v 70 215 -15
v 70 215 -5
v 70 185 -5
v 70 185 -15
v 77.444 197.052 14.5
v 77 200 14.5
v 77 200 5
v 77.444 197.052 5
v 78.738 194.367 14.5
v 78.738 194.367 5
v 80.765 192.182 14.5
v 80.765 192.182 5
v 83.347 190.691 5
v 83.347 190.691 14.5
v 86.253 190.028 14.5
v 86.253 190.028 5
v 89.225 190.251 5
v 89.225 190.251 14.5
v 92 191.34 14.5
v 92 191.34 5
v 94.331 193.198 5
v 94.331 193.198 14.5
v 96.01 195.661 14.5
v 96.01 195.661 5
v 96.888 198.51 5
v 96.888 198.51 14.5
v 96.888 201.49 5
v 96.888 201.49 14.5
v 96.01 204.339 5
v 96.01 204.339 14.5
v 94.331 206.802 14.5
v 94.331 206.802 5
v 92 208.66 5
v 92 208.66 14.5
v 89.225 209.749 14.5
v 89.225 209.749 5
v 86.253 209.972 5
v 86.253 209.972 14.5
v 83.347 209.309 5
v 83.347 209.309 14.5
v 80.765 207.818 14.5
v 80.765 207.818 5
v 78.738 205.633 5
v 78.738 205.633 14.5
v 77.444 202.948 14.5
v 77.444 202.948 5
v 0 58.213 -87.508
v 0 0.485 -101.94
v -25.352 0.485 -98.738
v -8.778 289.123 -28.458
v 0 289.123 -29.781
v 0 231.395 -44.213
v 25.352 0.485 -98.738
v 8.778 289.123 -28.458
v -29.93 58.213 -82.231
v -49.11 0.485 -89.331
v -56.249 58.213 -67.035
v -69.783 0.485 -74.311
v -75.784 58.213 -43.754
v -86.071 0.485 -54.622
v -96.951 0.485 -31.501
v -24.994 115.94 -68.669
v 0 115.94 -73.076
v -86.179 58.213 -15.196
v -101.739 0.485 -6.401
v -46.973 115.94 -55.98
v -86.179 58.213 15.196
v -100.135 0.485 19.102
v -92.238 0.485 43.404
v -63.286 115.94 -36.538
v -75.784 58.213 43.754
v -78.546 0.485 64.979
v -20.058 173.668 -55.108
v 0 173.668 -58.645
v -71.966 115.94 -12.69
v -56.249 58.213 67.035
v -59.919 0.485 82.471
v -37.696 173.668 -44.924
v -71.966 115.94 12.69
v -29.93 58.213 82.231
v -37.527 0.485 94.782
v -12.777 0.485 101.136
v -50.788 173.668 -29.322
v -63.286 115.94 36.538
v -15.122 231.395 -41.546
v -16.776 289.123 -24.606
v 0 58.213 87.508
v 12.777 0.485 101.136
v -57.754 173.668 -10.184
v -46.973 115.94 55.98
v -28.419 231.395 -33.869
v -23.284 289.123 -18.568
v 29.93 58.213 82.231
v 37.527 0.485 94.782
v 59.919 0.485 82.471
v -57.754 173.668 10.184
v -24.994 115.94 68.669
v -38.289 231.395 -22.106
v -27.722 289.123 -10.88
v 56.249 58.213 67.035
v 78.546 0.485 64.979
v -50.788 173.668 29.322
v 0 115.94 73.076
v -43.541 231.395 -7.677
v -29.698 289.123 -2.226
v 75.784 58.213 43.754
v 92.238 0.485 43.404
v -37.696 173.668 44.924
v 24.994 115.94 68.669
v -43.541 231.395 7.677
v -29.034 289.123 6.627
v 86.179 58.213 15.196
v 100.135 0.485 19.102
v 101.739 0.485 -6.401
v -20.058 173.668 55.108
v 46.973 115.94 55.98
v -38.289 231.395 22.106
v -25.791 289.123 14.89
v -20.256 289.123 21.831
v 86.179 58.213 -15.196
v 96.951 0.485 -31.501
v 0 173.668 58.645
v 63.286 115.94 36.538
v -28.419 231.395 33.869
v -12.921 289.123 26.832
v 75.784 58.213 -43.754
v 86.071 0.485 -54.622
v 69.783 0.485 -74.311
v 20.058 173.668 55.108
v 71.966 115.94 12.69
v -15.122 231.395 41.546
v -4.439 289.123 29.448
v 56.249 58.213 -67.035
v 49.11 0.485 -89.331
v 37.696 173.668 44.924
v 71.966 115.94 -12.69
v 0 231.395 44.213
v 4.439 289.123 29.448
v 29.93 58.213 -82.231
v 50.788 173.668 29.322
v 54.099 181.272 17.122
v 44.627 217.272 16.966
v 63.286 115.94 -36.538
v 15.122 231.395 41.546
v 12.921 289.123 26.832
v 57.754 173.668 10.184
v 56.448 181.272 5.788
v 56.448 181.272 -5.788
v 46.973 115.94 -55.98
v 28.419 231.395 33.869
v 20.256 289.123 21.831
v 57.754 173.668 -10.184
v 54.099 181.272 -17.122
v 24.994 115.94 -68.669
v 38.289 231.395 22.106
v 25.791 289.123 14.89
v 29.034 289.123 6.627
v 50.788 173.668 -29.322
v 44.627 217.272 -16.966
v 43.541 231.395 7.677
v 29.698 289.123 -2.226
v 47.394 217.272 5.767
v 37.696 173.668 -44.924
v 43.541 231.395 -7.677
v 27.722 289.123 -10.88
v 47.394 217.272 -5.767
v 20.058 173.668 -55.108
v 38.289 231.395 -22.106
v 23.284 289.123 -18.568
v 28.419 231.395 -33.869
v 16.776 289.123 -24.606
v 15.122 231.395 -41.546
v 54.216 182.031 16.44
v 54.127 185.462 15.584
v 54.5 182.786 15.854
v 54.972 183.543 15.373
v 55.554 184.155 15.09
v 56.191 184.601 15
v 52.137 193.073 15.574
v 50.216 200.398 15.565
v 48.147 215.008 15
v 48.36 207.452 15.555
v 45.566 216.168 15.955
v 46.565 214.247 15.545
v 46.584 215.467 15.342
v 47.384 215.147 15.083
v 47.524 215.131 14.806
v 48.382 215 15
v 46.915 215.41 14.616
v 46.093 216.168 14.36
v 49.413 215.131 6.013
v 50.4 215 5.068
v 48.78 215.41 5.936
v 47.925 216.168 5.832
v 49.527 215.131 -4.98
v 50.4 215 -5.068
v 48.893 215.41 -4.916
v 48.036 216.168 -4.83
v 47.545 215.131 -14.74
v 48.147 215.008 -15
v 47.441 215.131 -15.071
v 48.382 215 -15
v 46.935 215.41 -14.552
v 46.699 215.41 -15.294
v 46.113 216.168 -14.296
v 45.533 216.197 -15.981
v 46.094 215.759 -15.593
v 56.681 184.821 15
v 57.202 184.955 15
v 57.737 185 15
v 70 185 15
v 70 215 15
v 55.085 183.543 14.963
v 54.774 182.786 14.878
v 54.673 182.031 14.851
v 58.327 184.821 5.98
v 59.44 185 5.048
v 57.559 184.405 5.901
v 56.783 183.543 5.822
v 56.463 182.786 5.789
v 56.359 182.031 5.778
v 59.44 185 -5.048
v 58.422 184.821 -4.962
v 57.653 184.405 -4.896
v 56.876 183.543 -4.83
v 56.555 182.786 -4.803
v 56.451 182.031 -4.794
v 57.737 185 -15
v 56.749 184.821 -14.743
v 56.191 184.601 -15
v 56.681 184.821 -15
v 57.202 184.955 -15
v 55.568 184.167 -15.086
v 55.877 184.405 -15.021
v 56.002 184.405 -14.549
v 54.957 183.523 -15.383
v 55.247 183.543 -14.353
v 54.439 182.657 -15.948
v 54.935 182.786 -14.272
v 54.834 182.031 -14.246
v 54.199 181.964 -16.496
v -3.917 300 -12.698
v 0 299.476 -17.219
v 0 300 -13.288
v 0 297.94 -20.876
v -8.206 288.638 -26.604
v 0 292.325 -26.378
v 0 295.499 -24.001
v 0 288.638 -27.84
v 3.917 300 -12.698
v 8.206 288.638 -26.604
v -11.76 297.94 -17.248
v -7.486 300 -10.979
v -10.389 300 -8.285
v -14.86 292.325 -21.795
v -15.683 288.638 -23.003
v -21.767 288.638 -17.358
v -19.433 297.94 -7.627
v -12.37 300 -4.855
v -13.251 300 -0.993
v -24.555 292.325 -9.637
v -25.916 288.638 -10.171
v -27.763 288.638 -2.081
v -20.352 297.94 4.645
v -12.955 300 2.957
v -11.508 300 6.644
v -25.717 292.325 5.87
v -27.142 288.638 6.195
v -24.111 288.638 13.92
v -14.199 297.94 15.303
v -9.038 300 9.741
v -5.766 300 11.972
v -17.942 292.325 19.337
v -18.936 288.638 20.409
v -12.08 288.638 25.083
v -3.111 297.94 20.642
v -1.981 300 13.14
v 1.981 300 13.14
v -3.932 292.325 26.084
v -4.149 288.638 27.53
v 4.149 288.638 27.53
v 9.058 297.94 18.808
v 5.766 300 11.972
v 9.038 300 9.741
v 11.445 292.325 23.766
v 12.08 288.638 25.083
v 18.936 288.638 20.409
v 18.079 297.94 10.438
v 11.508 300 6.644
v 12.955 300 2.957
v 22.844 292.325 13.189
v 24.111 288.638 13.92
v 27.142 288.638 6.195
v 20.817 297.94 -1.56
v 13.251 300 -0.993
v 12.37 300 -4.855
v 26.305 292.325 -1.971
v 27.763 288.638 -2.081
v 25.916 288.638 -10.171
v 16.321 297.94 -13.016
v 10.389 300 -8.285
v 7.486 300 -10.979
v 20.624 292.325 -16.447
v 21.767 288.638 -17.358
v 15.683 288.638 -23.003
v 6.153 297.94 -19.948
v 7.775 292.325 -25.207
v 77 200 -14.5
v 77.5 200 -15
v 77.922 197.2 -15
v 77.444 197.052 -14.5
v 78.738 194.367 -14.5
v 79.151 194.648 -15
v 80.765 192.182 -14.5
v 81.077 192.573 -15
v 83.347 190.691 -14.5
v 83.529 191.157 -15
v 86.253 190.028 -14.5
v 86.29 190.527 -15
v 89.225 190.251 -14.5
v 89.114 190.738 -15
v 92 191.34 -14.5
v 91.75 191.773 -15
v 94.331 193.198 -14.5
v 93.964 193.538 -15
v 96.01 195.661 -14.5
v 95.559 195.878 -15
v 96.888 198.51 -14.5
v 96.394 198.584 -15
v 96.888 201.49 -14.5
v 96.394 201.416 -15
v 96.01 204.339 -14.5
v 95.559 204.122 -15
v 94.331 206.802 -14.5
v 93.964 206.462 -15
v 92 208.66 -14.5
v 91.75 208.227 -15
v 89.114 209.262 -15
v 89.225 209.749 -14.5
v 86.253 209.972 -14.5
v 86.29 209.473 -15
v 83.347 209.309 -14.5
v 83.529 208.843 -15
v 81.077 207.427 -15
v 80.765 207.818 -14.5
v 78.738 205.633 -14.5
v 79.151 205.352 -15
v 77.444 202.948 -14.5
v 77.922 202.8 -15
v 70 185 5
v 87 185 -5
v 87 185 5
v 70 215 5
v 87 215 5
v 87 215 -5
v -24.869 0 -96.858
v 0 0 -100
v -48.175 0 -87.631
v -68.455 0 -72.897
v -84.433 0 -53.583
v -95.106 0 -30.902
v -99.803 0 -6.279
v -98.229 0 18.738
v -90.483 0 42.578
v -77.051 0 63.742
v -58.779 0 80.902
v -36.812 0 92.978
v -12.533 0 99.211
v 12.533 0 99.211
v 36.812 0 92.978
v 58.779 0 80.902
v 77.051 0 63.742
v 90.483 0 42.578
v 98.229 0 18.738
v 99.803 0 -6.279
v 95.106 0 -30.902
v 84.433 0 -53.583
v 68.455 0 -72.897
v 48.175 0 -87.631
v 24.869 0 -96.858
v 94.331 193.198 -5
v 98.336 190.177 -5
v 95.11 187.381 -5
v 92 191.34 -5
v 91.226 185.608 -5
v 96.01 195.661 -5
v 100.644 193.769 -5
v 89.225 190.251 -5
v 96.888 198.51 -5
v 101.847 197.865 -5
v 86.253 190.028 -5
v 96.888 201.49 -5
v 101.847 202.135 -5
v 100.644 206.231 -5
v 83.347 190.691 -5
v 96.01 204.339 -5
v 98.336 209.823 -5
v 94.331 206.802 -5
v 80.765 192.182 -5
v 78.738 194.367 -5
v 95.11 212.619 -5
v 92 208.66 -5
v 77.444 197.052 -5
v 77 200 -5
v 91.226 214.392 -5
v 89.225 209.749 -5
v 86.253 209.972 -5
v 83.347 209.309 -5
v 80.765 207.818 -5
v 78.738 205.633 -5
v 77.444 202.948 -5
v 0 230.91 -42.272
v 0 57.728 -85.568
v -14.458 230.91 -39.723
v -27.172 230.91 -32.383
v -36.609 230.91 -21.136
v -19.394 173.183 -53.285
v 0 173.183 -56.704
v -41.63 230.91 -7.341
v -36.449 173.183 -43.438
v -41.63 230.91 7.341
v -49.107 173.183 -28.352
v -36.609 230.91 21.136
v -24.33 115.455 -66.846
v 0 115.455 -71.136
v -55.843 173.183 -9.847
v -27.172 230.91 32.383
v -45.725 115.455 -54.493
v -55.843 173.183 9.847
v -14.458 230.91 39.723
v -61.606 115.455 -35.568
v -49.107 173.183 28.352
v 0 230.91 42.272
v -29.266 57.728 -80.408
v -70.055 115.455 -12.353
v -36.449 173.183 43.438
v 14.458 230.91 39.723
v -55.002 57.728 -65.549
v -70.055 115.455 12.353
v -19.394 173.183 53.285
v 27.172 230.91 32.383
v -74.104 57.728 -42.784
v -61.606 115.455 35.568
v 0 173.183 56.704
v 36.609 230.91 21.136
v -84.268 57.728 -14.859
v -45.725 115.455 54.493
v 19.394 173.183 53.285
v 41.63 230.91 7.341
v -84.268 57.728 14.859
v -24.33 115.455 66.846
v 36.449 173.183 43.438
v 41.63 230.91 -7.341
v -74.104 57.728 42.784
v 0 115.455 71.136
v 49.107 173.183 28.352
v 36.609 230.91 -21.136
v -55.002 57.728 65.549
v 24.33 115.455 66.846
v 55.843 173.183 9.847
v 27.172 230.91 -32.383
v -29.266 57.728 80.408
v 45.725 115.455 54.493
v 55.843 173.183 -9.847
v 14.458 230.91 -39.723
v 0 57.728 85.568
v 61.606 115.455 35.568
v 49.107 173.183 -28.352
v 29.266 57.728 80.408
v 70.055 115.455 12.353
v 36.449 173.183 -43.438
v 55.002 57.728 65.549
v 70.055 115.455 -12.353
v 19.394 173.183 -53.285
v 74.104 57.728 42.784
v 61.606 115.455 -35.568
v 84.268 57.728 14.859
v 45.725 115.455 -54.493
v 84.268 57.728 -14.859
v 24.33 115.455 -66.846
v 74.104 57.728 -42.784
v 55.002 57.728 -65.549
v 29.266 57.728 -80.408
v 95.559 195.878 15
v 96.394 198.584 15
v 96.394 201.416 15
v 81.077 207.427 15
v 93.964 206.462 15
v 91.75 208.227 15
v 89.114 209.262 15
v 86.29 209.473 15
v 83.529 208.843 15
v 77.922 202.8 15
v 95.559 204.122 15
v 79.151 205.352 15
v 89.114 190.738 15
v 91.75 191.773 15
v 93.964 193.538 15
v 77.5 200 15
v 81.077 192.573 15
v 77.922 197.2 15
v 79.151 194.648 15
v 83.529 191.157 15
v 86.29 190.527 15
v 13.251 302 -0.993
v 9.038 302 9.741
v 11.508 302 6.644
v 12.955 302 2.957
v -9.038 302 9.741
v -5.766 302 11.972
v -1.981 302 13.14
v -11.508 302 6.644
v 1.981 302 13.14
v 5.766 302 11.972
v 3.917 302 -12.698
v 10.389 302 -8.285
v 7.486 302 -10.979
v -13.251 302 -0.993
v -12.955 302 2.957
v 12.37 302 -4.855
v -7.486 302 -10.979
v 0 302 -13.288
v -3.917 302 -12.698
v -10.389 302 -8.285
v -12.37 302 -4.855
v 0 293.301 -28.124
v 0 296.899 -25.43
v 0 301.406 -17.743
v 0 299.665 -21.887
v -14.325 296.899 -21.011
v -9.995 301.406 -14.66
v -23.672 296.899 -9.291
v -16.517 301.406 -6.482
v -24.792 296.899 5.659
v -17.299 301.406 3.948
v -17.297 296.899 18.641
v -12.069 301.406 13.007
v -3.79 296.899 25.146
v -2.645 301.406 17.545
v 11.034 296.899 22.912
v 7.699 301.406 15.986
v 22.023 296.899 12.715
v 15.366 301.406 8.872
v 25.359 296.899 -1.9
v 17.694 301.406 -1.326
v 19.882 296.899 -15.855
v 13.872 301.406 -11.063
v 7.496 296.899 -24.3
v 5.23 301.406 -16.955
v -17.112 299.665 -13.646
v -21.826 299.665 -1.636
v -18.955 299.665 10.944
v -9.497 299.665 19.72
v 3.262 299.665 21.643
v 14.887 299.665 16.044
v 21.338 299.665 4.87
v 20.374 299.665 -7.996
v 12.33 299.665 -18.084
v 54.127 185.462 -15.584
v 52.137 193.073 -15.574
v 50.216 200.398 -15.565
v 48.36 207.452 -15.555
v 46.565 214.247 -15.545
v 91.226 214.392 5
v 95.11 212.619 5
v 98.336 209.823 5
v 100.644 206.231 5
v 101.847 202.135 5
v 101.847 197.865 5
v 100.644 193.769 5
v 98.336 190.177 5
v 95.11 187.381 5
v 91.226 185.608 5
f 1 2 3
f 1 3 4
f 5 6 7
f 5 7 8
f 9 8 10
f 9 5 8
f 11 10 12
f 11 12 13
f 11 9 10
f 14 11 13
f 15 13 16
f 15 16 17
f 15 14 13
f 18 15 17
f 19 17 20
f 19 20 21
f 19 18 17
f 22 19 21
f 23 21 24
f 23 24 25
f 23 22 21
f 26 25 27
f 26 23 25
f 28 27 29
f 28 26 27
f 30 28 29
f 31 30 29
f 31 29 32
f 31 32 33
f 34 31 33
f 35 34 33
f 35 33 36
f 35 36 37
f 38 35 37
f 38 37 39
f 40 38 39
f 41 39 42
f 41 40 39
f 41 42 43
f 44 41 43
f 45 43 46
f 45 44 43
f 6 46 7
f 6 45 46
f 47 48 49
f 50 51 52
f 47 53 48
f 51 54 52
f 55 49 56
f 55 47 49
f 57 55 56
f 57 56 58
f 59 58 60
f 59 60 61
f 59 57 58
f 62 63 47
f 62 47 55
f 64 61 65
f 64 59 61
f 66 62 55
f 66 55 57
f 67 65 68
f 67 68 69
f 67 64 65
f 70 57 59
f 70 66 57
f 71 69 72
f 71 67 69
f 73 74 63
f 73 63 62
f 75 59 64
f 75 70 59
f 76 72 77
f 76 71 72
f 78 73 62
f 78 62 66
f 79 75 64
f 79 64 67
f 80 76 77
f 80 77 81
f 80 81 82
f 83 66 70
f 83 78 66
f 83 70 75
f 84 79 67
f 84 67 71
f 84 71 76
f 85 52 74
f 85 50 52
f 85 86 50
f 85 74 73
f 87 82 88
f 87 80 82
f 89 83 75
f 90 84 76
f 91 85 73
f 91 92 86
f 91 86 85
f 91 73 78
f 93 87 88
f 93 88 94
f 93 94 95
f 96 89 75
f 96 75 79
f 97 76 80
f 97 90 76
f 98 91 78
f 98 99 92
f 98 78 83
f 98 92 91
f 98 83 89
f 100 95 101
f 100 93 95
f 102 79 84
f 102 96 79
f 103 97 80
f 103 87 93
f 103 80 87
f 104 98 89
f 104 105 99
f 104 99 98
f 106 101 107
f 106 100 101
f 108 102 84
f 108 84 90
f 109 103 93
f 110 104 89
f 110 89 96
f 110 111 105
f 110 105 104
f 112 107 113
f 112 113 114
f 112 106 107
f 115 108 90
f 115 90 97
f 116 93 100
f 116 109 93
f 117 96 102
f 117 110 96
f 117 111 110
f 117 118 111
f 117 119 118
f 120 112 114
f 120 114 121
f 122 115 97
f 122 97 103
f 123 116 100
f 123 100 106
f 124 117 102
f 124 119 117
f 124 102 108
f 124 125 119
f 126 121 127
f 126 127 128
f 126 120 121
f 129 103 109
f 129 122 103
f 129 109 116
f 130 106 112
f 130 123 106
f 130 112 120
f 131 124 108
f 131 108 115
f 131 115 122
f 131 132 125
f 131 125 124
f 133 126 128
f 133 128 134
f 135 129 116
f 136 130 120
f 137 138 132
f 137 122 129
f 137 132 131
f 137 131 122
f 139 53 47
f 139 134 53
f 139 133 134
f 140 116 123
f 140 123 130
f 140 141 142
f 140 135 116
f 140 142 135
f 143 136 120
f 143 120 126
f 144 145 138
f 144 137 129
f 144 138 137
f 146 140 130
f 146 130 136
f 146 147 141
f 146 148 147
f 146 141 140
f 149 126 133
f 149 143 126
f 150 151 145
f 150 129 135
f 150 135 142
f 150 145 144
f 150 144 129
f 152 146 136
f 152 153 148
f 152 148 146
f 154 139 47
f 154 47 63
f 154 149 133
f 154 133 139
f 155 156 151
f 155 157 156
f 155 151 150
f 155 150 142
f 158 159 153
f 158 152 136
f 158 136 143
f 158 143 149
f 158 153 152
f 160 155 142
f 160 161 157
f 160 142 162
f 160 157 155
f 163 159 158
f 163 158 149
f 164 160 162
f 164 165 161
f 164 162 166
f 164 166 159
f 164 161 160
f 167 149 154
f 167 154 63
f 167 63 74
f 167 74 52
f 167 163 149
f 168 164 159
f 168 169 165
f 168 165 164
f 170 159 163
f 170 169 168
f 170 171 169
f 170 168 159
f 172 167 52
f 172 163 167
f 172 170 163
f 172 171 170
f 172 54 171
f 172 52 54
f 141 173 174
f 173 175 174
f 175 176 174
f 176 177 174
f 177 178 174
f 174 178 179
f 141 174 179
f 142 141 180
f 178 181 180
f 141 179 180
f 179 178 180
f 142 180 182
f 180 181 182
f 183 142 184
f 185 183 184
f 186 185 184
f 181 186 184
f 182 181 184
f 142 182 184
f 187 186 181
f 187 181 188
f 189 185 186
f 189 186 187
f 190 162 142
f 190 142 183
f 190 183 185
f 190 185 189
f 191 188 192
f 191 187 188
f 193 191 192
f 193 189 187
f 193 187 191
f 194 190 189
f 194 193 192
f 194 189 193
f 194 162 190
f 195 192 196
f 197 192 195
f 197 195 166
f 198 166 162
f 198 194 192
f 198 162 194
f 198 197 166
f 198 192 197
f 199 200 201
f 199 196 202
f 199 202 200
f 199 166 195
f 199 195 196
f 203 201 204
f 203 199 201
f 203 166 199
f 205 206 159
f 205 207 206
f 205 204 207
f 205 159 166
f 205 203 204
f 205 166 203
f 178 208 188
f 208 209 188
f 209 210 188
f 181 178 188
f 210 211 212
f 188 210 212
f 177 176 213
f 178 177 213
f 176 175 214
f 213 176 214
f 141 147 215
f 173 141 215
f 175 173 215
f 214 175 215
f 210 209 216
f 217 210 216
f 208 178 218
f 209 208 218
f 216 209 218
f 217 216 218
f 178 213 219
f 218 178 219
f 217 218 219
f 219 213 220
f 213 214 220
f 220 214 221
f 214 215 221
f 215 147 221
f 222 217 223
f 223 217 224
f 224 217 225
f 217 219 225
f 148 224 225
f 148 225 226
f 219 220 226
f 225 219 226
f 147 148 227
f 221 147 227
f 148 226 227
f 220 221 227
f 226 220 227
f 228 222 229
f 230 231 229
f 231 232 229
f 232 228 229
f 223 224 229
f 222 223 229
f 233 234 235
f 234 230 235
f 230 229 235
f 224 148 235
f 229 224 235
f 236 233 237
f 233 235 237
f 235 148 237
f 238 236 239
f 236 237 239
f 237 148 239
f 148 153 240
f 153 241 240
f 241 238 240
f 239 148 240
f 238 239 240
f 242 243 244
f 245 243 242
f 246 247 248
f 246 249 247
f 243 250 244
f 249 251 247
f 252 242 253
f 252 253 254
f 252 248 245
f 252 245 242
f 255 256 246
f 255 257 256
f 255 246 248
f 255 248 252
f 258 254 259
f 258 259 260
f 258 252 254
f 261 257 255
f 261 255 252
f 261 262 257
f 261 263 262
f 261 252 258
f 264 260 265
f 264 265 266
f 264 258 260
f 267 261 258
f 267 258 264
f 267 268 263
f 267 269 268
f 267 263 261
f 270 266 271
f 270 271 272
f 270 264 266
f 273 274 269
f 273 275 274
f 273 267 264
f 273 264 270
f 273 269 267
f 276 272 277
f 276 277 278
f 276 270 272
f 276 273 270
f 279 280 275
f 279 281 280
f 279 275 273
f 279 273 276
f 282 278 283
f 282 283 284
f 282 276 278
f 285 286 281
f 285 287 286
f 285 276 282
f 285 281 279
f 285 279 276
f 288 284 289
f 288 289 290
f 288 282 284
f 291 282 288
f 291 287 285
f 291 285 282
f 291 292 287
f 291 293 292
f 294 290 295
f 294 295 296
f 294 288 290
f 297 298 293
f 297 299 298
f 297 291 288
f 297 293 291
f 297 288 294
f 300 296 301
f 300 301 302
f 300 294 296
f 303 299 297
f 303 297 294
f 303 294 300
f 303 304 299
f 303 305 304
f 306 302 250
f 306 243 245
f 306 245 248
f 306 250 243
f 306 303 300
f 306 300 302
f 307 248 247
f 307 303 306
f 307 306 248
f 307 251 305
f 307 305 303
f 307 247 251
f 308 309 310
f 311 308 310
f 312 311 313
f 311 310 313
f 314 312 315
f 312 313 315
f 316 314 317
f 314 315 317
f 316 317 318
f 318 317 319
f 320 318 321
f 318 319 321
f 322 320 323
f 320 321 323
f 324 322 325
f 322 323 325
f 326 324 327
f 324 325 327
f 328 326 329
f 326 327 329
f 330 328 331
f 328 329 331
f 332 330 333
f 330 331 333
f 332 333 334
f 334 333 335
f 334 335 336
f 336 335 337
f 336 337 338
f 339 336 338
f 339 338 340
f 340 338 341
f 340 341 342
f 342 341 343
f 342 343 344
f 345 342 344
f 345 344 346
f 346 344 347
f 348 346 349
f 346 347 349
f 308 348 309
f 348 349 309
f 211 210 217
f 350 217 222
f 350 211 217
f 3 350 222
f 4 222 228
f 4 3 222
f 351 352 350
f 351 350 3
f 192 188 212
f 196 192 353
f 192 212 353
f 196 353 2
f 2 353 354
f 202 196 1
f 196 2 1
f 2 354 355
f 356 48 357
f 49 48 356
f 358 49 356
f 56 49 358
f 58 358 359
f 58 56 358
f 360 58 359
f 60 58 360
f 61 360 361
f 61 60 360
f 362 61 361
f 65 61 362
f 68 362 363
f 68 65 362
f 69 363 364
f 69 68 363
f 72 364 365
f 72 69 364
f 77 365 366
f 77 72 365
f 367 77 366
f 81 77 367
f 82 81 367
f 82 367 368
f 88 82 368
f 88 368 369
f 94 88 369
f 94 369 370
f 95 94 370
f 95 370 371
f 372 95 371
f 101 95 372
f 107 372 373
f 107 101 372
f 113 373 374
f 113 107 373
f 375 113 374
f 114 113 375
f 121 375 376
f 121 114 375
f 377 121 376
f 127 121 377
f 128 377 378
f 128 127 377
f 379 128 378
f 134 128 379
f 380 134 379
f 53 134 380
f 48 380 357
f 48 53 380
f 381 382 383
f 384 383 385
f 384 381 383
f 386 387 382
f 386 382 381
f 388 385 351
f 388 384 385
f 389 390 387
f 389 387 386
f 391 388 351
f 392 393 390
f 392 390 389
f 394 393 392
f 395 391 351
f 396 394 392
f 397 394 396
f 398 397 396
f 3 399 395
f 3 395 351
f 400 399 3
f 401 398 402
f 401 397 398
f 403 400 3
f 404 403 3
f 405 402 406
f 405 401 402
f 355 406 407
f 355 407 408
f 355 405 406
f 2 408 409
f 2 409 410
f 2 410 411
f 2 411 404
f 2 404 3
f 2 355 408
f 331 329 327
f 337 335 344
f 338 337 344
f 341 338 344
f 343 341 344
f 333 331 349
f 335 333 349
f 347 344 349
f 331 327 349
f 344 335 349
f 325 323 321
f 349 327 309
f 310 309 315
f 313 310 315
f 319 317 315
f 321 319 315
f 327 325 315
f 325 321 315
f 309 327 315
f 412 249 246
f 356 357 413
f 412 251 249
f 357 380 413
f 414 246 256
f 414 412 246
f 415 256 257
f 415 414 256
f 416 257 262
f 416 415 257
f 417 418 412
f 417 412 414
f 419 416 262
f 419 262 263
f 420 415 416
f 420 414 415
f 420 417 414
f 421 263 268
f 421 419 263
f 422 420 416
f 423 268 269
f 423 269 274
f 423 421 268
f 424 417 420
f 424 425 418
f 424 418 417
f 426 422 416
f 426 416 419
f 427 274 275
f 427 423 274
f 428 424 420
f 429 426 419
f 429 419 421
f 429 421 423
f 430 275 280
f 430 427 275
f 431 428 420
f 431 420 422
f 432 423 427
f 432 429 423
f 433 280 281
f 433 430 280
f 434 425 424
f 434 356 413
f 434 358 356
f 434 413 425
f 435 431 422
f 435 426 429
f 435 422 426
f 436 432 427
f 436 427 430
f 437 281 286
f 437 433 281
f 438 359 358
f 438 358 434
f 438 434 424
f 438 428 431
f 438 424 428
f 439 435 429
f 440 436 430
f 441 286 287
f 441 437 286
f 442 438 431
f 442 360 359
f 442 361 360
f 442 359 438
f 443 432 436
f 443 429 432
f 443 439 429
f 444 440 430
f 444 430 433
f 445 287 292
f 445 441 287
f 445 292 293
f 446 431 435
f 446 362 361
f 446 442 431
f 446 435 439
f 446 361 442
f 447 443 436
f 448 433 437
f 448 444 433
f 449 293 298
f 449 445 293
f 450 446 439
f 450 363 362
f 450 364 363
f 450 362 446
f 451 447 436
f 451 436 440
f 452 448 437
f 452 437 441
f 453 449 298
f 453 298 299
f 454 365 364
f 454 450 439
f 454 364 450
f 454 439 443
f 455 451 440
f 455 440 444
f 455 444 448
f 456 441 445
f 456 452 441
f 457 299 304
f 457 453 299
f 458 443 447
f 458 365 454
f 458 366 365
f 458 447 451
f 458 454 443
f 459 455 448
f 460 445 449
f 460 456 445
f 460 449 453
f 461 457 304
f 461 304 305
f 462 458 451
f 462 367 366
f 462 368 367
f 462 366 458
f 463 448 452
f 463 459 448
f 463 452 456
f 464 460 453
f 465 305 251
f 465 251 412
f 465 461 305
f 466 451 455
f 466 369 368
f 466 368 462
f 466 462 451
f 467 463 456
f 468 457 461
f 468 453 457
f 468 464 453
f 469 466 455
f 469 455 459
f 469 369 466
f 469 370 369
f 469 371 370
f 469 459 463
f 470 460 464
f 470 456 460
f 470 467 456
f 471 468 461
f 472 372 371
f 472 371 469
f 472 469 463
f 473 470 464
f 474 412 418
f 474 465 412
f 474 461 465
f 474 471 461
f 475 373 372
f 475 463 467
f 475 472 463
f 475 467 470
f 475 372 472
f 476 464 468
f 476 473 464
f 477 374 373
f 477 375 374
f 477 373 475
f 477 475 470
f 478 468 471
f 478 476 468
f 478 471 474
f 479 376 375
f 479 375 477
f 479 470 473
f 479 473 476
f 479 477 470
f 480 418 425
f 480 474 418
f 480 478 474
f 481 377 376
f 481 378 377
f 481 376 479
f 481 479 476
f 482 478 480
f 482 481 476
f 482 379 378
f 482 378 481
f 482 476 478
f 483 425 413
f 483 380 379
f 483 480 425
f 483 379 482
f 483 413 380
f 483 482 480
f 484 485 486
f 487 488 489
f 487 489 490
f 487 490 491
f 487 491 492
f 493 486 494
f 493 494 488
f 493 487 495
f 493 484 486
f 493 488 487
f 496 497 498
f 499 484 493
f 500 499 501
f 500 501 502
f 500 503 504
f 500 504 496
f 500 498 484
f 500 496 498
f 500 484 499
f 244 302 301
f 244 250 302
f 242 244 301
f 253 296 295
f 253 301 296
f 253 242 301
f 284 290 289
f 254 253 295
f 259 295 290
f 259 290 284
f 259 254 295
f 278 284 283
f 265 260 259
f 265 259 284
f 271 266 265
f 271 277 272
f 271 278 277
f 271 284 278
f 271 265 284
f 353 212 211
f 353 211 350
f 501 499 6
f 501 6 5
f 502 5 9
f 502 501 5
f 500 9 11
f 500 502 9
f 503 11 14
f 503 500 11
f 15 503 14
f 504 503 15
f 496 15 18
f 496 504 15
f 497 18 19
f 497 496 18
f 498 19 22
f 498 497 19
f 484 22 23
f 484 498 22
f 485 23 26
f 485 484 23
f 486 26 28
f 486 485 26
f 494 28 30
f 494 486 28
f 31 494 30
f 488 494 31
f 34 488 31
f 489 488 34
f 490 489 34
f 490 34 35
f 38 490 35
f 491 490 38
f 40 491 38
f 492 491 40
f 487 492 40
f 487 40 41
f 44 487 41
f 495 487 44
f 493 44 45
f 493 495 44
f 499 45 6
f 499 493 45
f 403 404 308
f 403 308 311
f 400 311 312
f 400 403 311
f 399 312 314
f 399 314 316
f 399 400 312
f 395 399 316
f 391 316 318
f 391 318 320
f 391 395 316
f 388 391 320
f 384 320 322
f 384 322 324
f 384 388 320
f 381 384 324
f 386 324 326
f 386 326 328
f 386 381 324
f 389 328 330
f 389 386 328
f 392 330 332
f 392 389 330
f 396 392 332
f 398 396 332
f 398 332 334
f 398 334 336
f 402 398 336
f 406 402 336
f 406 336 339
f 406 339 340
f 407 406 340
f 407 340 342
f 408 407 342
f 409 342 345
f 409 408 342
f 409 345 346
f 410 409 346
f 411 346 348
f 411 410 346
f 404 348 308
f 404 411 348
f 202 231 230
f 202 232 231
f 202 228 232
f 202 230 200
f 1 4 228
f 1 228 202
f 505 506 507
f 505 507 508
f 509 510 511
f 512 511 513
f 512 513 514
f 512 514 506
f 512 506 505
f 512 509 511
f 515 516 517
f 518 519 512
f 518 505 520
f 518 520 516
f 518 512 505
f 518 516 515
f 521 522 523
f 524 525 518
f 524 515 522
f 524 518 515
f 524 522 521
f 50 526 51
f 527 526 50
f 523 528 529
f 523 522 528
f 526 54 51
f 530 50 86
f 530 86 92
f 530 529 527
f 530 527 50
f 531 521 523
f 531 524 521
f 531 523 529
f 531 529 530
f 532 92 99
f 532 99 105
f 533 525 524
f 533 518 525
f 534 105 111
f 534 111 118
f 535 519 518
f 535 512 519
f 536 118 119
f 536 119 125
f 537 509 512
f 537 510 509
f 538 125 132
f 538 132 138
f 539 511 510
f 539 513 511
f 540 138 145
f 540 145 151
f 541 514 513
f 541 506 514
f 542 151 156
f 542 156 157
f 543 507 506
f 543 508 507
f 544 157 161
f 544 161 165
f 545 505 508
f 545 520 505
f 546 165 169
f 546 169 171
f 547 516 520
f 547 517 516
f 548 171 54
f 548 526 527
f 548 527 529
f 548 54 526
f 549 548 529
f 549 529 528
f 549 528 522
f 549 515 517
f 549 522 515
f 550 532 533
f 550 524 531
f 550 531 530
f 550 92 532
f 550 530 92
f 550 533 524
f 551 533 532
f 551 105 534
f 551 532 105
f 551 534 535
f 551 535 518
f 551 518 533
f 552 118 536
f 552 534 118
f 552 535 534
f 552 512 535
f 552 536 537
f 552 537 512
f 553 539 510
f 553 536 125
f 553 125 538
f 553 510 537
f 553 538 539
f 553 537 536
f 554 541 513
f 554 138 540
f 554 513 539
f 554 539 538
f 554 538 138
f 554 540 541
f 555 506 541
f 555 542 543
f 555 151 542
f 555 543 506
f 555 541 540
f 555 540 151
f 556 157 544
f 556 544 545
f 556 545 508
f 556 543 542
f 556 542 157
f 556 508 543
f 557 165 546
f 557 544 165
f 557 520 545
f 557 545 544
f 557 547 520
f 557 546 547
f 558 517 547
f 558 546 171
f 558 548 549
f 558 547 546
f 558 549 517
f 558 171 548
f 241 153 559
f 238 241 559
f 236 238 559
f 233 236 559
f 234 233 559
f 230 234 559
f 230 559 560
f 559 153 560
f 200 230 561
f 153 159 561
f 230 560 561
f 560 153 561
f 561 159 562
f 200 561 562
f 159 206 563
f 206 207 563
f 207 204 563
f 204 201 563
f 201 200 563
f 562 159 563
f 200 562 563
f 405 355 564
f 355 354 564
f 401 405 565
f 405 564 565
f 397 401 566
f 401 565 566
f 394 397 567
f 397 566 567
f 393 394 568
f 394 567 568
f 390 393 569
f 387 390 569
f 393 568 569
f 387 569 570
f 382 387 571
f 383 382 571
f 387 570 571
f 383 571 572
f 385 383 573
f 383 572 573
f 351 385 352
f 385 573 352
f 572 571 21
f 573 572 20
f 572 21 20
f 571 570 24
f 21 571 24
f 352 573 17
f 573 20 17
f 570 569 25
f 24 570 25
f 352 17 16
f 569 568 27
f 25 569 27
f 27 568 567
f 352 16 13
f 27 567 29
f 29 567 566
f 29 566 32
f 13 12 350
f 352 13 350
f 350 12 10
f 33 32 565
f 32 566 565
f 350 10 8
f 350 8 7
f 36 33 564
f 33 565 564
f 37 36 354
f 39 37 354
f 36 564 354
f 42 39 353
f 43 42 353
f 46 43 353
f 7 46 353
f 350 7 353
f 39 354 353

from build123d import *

# Parameters (mm, degrees)
BOSS_EXTRUDE1_REACH = 406.646
BOSS_EXTRUDE1_START = 70
SKETCH3_W           = 30
SKETCH3_H           = 30
BOSS_EXTRUDE2_DEPTH = 5
SKETCH5_R           = 10
BOSS_EXTRUDE3_DEPTH = 15
FILLET1_R           = 3
CHAMFER1_SIZE       = 0.5


with BuildPart() as part:
    # Sketch2 → Revolve-Thin1 (revolve)
    with BuildSketch(Plane.XY, mode=Mode.PRIVATE) as revolve_thin1_sk:
        with BuildLine():
            Line((0, 300), (-13.288353904, 300))
            ThreePointArc((-13.288353904, 300), (-22.519537045, 296.82308157), (-27.840491406, 288.638034376))
            Line((-27.840491406, 288.638034376), (-100, 0))
            Line((-100, 0), (-101.940285, 0.48507125))
            Line((-101.940285, 0.48507125), (-29.780776406, 289.123105626))
            ThreePointArc((-29.780776406, 289.123105626), (-23.750361464, 298.399492446), (-13.288353904, 302))
            Line((-13.288353904, 302), (0, 302))
            Line((0, 302), (0, 300))
        make_face()
    revolve(revolve_thin1_sk.sketch.rotate(Axis((0, 0, 0), (0, 1, 0)), 270), axis=Axis((0, 0, 0), (0, 1, 0)))

    # Sketch3 → Boss-Extrude1 (add, up to next)
    with BuildSketch(Plane(origin=(0, 0, 0), x_dir=(0, 0, -1), z_dir=(1, 0, 0)).offset(BOSS_EXTRUDE1_START), mode=Mode.PRIVATE) as boss_extrude1_sk1:
        with Locations((0, 200)):
            Rectangle(SKETCH3_W, SKETCH3_H)
    boss_extrude1_tool1 = extrude(boss_extrude1_sk1.sketch, amount=-BOSS_EXTRUDE1_REACH, mode=Mode.PRIVATE) - part.part
    add(boss_extrude1_tool1.solids().sort_by_distance((70, 200, 0))[0])

    # Sketch4 → Boss-Extrude2 (add, symmetric)
    with BuildSketch(Plane.XY):
        with BuildLine():
            Line((70, 215), (87, 215))
            ThreePointArc((87, 215), (102, 200), (87, 185))
            Line((87, 185), (70, 185))
            Line((70, 185), (70, 215))
        make_face()
    extrude(amount=BOSS_EXTRUDE2_DEPTH, both=True)

    # Sketch5 → Boss-Extrude3 (add, symmetric)
    with BuildSketch(Plane.XY):
        with Locations(Location((87, 200, 0), (0, 0, 180))):
            Circle(SKETCH5_R)
    extrude(amount=BOSS_EXTRUDE3_DEPTH, both=True)

    # Fillet1
    fillet1_edges = [part.edges().sort_by_distance(p)[0] for p in [
        (48.311552813, 215, 0),
        (49.853019013, 200.003141557, -15),
        (49.853019013, 200.003141557, 15),
        (55.811552813, 185, 0),
    ]]
    fillet(fillet1_edges, radius=FILLET1_R)

    # Chamfer1
    chamfer1_edges = [part.edges().sort_by_distance(p)[0] for p in [
        (97, 200, -15),
        (97, 200, 15),
    ]]
    chamfer(chamfer1_edges, length=CHAMFER1_SIZE)


solid = part.part
